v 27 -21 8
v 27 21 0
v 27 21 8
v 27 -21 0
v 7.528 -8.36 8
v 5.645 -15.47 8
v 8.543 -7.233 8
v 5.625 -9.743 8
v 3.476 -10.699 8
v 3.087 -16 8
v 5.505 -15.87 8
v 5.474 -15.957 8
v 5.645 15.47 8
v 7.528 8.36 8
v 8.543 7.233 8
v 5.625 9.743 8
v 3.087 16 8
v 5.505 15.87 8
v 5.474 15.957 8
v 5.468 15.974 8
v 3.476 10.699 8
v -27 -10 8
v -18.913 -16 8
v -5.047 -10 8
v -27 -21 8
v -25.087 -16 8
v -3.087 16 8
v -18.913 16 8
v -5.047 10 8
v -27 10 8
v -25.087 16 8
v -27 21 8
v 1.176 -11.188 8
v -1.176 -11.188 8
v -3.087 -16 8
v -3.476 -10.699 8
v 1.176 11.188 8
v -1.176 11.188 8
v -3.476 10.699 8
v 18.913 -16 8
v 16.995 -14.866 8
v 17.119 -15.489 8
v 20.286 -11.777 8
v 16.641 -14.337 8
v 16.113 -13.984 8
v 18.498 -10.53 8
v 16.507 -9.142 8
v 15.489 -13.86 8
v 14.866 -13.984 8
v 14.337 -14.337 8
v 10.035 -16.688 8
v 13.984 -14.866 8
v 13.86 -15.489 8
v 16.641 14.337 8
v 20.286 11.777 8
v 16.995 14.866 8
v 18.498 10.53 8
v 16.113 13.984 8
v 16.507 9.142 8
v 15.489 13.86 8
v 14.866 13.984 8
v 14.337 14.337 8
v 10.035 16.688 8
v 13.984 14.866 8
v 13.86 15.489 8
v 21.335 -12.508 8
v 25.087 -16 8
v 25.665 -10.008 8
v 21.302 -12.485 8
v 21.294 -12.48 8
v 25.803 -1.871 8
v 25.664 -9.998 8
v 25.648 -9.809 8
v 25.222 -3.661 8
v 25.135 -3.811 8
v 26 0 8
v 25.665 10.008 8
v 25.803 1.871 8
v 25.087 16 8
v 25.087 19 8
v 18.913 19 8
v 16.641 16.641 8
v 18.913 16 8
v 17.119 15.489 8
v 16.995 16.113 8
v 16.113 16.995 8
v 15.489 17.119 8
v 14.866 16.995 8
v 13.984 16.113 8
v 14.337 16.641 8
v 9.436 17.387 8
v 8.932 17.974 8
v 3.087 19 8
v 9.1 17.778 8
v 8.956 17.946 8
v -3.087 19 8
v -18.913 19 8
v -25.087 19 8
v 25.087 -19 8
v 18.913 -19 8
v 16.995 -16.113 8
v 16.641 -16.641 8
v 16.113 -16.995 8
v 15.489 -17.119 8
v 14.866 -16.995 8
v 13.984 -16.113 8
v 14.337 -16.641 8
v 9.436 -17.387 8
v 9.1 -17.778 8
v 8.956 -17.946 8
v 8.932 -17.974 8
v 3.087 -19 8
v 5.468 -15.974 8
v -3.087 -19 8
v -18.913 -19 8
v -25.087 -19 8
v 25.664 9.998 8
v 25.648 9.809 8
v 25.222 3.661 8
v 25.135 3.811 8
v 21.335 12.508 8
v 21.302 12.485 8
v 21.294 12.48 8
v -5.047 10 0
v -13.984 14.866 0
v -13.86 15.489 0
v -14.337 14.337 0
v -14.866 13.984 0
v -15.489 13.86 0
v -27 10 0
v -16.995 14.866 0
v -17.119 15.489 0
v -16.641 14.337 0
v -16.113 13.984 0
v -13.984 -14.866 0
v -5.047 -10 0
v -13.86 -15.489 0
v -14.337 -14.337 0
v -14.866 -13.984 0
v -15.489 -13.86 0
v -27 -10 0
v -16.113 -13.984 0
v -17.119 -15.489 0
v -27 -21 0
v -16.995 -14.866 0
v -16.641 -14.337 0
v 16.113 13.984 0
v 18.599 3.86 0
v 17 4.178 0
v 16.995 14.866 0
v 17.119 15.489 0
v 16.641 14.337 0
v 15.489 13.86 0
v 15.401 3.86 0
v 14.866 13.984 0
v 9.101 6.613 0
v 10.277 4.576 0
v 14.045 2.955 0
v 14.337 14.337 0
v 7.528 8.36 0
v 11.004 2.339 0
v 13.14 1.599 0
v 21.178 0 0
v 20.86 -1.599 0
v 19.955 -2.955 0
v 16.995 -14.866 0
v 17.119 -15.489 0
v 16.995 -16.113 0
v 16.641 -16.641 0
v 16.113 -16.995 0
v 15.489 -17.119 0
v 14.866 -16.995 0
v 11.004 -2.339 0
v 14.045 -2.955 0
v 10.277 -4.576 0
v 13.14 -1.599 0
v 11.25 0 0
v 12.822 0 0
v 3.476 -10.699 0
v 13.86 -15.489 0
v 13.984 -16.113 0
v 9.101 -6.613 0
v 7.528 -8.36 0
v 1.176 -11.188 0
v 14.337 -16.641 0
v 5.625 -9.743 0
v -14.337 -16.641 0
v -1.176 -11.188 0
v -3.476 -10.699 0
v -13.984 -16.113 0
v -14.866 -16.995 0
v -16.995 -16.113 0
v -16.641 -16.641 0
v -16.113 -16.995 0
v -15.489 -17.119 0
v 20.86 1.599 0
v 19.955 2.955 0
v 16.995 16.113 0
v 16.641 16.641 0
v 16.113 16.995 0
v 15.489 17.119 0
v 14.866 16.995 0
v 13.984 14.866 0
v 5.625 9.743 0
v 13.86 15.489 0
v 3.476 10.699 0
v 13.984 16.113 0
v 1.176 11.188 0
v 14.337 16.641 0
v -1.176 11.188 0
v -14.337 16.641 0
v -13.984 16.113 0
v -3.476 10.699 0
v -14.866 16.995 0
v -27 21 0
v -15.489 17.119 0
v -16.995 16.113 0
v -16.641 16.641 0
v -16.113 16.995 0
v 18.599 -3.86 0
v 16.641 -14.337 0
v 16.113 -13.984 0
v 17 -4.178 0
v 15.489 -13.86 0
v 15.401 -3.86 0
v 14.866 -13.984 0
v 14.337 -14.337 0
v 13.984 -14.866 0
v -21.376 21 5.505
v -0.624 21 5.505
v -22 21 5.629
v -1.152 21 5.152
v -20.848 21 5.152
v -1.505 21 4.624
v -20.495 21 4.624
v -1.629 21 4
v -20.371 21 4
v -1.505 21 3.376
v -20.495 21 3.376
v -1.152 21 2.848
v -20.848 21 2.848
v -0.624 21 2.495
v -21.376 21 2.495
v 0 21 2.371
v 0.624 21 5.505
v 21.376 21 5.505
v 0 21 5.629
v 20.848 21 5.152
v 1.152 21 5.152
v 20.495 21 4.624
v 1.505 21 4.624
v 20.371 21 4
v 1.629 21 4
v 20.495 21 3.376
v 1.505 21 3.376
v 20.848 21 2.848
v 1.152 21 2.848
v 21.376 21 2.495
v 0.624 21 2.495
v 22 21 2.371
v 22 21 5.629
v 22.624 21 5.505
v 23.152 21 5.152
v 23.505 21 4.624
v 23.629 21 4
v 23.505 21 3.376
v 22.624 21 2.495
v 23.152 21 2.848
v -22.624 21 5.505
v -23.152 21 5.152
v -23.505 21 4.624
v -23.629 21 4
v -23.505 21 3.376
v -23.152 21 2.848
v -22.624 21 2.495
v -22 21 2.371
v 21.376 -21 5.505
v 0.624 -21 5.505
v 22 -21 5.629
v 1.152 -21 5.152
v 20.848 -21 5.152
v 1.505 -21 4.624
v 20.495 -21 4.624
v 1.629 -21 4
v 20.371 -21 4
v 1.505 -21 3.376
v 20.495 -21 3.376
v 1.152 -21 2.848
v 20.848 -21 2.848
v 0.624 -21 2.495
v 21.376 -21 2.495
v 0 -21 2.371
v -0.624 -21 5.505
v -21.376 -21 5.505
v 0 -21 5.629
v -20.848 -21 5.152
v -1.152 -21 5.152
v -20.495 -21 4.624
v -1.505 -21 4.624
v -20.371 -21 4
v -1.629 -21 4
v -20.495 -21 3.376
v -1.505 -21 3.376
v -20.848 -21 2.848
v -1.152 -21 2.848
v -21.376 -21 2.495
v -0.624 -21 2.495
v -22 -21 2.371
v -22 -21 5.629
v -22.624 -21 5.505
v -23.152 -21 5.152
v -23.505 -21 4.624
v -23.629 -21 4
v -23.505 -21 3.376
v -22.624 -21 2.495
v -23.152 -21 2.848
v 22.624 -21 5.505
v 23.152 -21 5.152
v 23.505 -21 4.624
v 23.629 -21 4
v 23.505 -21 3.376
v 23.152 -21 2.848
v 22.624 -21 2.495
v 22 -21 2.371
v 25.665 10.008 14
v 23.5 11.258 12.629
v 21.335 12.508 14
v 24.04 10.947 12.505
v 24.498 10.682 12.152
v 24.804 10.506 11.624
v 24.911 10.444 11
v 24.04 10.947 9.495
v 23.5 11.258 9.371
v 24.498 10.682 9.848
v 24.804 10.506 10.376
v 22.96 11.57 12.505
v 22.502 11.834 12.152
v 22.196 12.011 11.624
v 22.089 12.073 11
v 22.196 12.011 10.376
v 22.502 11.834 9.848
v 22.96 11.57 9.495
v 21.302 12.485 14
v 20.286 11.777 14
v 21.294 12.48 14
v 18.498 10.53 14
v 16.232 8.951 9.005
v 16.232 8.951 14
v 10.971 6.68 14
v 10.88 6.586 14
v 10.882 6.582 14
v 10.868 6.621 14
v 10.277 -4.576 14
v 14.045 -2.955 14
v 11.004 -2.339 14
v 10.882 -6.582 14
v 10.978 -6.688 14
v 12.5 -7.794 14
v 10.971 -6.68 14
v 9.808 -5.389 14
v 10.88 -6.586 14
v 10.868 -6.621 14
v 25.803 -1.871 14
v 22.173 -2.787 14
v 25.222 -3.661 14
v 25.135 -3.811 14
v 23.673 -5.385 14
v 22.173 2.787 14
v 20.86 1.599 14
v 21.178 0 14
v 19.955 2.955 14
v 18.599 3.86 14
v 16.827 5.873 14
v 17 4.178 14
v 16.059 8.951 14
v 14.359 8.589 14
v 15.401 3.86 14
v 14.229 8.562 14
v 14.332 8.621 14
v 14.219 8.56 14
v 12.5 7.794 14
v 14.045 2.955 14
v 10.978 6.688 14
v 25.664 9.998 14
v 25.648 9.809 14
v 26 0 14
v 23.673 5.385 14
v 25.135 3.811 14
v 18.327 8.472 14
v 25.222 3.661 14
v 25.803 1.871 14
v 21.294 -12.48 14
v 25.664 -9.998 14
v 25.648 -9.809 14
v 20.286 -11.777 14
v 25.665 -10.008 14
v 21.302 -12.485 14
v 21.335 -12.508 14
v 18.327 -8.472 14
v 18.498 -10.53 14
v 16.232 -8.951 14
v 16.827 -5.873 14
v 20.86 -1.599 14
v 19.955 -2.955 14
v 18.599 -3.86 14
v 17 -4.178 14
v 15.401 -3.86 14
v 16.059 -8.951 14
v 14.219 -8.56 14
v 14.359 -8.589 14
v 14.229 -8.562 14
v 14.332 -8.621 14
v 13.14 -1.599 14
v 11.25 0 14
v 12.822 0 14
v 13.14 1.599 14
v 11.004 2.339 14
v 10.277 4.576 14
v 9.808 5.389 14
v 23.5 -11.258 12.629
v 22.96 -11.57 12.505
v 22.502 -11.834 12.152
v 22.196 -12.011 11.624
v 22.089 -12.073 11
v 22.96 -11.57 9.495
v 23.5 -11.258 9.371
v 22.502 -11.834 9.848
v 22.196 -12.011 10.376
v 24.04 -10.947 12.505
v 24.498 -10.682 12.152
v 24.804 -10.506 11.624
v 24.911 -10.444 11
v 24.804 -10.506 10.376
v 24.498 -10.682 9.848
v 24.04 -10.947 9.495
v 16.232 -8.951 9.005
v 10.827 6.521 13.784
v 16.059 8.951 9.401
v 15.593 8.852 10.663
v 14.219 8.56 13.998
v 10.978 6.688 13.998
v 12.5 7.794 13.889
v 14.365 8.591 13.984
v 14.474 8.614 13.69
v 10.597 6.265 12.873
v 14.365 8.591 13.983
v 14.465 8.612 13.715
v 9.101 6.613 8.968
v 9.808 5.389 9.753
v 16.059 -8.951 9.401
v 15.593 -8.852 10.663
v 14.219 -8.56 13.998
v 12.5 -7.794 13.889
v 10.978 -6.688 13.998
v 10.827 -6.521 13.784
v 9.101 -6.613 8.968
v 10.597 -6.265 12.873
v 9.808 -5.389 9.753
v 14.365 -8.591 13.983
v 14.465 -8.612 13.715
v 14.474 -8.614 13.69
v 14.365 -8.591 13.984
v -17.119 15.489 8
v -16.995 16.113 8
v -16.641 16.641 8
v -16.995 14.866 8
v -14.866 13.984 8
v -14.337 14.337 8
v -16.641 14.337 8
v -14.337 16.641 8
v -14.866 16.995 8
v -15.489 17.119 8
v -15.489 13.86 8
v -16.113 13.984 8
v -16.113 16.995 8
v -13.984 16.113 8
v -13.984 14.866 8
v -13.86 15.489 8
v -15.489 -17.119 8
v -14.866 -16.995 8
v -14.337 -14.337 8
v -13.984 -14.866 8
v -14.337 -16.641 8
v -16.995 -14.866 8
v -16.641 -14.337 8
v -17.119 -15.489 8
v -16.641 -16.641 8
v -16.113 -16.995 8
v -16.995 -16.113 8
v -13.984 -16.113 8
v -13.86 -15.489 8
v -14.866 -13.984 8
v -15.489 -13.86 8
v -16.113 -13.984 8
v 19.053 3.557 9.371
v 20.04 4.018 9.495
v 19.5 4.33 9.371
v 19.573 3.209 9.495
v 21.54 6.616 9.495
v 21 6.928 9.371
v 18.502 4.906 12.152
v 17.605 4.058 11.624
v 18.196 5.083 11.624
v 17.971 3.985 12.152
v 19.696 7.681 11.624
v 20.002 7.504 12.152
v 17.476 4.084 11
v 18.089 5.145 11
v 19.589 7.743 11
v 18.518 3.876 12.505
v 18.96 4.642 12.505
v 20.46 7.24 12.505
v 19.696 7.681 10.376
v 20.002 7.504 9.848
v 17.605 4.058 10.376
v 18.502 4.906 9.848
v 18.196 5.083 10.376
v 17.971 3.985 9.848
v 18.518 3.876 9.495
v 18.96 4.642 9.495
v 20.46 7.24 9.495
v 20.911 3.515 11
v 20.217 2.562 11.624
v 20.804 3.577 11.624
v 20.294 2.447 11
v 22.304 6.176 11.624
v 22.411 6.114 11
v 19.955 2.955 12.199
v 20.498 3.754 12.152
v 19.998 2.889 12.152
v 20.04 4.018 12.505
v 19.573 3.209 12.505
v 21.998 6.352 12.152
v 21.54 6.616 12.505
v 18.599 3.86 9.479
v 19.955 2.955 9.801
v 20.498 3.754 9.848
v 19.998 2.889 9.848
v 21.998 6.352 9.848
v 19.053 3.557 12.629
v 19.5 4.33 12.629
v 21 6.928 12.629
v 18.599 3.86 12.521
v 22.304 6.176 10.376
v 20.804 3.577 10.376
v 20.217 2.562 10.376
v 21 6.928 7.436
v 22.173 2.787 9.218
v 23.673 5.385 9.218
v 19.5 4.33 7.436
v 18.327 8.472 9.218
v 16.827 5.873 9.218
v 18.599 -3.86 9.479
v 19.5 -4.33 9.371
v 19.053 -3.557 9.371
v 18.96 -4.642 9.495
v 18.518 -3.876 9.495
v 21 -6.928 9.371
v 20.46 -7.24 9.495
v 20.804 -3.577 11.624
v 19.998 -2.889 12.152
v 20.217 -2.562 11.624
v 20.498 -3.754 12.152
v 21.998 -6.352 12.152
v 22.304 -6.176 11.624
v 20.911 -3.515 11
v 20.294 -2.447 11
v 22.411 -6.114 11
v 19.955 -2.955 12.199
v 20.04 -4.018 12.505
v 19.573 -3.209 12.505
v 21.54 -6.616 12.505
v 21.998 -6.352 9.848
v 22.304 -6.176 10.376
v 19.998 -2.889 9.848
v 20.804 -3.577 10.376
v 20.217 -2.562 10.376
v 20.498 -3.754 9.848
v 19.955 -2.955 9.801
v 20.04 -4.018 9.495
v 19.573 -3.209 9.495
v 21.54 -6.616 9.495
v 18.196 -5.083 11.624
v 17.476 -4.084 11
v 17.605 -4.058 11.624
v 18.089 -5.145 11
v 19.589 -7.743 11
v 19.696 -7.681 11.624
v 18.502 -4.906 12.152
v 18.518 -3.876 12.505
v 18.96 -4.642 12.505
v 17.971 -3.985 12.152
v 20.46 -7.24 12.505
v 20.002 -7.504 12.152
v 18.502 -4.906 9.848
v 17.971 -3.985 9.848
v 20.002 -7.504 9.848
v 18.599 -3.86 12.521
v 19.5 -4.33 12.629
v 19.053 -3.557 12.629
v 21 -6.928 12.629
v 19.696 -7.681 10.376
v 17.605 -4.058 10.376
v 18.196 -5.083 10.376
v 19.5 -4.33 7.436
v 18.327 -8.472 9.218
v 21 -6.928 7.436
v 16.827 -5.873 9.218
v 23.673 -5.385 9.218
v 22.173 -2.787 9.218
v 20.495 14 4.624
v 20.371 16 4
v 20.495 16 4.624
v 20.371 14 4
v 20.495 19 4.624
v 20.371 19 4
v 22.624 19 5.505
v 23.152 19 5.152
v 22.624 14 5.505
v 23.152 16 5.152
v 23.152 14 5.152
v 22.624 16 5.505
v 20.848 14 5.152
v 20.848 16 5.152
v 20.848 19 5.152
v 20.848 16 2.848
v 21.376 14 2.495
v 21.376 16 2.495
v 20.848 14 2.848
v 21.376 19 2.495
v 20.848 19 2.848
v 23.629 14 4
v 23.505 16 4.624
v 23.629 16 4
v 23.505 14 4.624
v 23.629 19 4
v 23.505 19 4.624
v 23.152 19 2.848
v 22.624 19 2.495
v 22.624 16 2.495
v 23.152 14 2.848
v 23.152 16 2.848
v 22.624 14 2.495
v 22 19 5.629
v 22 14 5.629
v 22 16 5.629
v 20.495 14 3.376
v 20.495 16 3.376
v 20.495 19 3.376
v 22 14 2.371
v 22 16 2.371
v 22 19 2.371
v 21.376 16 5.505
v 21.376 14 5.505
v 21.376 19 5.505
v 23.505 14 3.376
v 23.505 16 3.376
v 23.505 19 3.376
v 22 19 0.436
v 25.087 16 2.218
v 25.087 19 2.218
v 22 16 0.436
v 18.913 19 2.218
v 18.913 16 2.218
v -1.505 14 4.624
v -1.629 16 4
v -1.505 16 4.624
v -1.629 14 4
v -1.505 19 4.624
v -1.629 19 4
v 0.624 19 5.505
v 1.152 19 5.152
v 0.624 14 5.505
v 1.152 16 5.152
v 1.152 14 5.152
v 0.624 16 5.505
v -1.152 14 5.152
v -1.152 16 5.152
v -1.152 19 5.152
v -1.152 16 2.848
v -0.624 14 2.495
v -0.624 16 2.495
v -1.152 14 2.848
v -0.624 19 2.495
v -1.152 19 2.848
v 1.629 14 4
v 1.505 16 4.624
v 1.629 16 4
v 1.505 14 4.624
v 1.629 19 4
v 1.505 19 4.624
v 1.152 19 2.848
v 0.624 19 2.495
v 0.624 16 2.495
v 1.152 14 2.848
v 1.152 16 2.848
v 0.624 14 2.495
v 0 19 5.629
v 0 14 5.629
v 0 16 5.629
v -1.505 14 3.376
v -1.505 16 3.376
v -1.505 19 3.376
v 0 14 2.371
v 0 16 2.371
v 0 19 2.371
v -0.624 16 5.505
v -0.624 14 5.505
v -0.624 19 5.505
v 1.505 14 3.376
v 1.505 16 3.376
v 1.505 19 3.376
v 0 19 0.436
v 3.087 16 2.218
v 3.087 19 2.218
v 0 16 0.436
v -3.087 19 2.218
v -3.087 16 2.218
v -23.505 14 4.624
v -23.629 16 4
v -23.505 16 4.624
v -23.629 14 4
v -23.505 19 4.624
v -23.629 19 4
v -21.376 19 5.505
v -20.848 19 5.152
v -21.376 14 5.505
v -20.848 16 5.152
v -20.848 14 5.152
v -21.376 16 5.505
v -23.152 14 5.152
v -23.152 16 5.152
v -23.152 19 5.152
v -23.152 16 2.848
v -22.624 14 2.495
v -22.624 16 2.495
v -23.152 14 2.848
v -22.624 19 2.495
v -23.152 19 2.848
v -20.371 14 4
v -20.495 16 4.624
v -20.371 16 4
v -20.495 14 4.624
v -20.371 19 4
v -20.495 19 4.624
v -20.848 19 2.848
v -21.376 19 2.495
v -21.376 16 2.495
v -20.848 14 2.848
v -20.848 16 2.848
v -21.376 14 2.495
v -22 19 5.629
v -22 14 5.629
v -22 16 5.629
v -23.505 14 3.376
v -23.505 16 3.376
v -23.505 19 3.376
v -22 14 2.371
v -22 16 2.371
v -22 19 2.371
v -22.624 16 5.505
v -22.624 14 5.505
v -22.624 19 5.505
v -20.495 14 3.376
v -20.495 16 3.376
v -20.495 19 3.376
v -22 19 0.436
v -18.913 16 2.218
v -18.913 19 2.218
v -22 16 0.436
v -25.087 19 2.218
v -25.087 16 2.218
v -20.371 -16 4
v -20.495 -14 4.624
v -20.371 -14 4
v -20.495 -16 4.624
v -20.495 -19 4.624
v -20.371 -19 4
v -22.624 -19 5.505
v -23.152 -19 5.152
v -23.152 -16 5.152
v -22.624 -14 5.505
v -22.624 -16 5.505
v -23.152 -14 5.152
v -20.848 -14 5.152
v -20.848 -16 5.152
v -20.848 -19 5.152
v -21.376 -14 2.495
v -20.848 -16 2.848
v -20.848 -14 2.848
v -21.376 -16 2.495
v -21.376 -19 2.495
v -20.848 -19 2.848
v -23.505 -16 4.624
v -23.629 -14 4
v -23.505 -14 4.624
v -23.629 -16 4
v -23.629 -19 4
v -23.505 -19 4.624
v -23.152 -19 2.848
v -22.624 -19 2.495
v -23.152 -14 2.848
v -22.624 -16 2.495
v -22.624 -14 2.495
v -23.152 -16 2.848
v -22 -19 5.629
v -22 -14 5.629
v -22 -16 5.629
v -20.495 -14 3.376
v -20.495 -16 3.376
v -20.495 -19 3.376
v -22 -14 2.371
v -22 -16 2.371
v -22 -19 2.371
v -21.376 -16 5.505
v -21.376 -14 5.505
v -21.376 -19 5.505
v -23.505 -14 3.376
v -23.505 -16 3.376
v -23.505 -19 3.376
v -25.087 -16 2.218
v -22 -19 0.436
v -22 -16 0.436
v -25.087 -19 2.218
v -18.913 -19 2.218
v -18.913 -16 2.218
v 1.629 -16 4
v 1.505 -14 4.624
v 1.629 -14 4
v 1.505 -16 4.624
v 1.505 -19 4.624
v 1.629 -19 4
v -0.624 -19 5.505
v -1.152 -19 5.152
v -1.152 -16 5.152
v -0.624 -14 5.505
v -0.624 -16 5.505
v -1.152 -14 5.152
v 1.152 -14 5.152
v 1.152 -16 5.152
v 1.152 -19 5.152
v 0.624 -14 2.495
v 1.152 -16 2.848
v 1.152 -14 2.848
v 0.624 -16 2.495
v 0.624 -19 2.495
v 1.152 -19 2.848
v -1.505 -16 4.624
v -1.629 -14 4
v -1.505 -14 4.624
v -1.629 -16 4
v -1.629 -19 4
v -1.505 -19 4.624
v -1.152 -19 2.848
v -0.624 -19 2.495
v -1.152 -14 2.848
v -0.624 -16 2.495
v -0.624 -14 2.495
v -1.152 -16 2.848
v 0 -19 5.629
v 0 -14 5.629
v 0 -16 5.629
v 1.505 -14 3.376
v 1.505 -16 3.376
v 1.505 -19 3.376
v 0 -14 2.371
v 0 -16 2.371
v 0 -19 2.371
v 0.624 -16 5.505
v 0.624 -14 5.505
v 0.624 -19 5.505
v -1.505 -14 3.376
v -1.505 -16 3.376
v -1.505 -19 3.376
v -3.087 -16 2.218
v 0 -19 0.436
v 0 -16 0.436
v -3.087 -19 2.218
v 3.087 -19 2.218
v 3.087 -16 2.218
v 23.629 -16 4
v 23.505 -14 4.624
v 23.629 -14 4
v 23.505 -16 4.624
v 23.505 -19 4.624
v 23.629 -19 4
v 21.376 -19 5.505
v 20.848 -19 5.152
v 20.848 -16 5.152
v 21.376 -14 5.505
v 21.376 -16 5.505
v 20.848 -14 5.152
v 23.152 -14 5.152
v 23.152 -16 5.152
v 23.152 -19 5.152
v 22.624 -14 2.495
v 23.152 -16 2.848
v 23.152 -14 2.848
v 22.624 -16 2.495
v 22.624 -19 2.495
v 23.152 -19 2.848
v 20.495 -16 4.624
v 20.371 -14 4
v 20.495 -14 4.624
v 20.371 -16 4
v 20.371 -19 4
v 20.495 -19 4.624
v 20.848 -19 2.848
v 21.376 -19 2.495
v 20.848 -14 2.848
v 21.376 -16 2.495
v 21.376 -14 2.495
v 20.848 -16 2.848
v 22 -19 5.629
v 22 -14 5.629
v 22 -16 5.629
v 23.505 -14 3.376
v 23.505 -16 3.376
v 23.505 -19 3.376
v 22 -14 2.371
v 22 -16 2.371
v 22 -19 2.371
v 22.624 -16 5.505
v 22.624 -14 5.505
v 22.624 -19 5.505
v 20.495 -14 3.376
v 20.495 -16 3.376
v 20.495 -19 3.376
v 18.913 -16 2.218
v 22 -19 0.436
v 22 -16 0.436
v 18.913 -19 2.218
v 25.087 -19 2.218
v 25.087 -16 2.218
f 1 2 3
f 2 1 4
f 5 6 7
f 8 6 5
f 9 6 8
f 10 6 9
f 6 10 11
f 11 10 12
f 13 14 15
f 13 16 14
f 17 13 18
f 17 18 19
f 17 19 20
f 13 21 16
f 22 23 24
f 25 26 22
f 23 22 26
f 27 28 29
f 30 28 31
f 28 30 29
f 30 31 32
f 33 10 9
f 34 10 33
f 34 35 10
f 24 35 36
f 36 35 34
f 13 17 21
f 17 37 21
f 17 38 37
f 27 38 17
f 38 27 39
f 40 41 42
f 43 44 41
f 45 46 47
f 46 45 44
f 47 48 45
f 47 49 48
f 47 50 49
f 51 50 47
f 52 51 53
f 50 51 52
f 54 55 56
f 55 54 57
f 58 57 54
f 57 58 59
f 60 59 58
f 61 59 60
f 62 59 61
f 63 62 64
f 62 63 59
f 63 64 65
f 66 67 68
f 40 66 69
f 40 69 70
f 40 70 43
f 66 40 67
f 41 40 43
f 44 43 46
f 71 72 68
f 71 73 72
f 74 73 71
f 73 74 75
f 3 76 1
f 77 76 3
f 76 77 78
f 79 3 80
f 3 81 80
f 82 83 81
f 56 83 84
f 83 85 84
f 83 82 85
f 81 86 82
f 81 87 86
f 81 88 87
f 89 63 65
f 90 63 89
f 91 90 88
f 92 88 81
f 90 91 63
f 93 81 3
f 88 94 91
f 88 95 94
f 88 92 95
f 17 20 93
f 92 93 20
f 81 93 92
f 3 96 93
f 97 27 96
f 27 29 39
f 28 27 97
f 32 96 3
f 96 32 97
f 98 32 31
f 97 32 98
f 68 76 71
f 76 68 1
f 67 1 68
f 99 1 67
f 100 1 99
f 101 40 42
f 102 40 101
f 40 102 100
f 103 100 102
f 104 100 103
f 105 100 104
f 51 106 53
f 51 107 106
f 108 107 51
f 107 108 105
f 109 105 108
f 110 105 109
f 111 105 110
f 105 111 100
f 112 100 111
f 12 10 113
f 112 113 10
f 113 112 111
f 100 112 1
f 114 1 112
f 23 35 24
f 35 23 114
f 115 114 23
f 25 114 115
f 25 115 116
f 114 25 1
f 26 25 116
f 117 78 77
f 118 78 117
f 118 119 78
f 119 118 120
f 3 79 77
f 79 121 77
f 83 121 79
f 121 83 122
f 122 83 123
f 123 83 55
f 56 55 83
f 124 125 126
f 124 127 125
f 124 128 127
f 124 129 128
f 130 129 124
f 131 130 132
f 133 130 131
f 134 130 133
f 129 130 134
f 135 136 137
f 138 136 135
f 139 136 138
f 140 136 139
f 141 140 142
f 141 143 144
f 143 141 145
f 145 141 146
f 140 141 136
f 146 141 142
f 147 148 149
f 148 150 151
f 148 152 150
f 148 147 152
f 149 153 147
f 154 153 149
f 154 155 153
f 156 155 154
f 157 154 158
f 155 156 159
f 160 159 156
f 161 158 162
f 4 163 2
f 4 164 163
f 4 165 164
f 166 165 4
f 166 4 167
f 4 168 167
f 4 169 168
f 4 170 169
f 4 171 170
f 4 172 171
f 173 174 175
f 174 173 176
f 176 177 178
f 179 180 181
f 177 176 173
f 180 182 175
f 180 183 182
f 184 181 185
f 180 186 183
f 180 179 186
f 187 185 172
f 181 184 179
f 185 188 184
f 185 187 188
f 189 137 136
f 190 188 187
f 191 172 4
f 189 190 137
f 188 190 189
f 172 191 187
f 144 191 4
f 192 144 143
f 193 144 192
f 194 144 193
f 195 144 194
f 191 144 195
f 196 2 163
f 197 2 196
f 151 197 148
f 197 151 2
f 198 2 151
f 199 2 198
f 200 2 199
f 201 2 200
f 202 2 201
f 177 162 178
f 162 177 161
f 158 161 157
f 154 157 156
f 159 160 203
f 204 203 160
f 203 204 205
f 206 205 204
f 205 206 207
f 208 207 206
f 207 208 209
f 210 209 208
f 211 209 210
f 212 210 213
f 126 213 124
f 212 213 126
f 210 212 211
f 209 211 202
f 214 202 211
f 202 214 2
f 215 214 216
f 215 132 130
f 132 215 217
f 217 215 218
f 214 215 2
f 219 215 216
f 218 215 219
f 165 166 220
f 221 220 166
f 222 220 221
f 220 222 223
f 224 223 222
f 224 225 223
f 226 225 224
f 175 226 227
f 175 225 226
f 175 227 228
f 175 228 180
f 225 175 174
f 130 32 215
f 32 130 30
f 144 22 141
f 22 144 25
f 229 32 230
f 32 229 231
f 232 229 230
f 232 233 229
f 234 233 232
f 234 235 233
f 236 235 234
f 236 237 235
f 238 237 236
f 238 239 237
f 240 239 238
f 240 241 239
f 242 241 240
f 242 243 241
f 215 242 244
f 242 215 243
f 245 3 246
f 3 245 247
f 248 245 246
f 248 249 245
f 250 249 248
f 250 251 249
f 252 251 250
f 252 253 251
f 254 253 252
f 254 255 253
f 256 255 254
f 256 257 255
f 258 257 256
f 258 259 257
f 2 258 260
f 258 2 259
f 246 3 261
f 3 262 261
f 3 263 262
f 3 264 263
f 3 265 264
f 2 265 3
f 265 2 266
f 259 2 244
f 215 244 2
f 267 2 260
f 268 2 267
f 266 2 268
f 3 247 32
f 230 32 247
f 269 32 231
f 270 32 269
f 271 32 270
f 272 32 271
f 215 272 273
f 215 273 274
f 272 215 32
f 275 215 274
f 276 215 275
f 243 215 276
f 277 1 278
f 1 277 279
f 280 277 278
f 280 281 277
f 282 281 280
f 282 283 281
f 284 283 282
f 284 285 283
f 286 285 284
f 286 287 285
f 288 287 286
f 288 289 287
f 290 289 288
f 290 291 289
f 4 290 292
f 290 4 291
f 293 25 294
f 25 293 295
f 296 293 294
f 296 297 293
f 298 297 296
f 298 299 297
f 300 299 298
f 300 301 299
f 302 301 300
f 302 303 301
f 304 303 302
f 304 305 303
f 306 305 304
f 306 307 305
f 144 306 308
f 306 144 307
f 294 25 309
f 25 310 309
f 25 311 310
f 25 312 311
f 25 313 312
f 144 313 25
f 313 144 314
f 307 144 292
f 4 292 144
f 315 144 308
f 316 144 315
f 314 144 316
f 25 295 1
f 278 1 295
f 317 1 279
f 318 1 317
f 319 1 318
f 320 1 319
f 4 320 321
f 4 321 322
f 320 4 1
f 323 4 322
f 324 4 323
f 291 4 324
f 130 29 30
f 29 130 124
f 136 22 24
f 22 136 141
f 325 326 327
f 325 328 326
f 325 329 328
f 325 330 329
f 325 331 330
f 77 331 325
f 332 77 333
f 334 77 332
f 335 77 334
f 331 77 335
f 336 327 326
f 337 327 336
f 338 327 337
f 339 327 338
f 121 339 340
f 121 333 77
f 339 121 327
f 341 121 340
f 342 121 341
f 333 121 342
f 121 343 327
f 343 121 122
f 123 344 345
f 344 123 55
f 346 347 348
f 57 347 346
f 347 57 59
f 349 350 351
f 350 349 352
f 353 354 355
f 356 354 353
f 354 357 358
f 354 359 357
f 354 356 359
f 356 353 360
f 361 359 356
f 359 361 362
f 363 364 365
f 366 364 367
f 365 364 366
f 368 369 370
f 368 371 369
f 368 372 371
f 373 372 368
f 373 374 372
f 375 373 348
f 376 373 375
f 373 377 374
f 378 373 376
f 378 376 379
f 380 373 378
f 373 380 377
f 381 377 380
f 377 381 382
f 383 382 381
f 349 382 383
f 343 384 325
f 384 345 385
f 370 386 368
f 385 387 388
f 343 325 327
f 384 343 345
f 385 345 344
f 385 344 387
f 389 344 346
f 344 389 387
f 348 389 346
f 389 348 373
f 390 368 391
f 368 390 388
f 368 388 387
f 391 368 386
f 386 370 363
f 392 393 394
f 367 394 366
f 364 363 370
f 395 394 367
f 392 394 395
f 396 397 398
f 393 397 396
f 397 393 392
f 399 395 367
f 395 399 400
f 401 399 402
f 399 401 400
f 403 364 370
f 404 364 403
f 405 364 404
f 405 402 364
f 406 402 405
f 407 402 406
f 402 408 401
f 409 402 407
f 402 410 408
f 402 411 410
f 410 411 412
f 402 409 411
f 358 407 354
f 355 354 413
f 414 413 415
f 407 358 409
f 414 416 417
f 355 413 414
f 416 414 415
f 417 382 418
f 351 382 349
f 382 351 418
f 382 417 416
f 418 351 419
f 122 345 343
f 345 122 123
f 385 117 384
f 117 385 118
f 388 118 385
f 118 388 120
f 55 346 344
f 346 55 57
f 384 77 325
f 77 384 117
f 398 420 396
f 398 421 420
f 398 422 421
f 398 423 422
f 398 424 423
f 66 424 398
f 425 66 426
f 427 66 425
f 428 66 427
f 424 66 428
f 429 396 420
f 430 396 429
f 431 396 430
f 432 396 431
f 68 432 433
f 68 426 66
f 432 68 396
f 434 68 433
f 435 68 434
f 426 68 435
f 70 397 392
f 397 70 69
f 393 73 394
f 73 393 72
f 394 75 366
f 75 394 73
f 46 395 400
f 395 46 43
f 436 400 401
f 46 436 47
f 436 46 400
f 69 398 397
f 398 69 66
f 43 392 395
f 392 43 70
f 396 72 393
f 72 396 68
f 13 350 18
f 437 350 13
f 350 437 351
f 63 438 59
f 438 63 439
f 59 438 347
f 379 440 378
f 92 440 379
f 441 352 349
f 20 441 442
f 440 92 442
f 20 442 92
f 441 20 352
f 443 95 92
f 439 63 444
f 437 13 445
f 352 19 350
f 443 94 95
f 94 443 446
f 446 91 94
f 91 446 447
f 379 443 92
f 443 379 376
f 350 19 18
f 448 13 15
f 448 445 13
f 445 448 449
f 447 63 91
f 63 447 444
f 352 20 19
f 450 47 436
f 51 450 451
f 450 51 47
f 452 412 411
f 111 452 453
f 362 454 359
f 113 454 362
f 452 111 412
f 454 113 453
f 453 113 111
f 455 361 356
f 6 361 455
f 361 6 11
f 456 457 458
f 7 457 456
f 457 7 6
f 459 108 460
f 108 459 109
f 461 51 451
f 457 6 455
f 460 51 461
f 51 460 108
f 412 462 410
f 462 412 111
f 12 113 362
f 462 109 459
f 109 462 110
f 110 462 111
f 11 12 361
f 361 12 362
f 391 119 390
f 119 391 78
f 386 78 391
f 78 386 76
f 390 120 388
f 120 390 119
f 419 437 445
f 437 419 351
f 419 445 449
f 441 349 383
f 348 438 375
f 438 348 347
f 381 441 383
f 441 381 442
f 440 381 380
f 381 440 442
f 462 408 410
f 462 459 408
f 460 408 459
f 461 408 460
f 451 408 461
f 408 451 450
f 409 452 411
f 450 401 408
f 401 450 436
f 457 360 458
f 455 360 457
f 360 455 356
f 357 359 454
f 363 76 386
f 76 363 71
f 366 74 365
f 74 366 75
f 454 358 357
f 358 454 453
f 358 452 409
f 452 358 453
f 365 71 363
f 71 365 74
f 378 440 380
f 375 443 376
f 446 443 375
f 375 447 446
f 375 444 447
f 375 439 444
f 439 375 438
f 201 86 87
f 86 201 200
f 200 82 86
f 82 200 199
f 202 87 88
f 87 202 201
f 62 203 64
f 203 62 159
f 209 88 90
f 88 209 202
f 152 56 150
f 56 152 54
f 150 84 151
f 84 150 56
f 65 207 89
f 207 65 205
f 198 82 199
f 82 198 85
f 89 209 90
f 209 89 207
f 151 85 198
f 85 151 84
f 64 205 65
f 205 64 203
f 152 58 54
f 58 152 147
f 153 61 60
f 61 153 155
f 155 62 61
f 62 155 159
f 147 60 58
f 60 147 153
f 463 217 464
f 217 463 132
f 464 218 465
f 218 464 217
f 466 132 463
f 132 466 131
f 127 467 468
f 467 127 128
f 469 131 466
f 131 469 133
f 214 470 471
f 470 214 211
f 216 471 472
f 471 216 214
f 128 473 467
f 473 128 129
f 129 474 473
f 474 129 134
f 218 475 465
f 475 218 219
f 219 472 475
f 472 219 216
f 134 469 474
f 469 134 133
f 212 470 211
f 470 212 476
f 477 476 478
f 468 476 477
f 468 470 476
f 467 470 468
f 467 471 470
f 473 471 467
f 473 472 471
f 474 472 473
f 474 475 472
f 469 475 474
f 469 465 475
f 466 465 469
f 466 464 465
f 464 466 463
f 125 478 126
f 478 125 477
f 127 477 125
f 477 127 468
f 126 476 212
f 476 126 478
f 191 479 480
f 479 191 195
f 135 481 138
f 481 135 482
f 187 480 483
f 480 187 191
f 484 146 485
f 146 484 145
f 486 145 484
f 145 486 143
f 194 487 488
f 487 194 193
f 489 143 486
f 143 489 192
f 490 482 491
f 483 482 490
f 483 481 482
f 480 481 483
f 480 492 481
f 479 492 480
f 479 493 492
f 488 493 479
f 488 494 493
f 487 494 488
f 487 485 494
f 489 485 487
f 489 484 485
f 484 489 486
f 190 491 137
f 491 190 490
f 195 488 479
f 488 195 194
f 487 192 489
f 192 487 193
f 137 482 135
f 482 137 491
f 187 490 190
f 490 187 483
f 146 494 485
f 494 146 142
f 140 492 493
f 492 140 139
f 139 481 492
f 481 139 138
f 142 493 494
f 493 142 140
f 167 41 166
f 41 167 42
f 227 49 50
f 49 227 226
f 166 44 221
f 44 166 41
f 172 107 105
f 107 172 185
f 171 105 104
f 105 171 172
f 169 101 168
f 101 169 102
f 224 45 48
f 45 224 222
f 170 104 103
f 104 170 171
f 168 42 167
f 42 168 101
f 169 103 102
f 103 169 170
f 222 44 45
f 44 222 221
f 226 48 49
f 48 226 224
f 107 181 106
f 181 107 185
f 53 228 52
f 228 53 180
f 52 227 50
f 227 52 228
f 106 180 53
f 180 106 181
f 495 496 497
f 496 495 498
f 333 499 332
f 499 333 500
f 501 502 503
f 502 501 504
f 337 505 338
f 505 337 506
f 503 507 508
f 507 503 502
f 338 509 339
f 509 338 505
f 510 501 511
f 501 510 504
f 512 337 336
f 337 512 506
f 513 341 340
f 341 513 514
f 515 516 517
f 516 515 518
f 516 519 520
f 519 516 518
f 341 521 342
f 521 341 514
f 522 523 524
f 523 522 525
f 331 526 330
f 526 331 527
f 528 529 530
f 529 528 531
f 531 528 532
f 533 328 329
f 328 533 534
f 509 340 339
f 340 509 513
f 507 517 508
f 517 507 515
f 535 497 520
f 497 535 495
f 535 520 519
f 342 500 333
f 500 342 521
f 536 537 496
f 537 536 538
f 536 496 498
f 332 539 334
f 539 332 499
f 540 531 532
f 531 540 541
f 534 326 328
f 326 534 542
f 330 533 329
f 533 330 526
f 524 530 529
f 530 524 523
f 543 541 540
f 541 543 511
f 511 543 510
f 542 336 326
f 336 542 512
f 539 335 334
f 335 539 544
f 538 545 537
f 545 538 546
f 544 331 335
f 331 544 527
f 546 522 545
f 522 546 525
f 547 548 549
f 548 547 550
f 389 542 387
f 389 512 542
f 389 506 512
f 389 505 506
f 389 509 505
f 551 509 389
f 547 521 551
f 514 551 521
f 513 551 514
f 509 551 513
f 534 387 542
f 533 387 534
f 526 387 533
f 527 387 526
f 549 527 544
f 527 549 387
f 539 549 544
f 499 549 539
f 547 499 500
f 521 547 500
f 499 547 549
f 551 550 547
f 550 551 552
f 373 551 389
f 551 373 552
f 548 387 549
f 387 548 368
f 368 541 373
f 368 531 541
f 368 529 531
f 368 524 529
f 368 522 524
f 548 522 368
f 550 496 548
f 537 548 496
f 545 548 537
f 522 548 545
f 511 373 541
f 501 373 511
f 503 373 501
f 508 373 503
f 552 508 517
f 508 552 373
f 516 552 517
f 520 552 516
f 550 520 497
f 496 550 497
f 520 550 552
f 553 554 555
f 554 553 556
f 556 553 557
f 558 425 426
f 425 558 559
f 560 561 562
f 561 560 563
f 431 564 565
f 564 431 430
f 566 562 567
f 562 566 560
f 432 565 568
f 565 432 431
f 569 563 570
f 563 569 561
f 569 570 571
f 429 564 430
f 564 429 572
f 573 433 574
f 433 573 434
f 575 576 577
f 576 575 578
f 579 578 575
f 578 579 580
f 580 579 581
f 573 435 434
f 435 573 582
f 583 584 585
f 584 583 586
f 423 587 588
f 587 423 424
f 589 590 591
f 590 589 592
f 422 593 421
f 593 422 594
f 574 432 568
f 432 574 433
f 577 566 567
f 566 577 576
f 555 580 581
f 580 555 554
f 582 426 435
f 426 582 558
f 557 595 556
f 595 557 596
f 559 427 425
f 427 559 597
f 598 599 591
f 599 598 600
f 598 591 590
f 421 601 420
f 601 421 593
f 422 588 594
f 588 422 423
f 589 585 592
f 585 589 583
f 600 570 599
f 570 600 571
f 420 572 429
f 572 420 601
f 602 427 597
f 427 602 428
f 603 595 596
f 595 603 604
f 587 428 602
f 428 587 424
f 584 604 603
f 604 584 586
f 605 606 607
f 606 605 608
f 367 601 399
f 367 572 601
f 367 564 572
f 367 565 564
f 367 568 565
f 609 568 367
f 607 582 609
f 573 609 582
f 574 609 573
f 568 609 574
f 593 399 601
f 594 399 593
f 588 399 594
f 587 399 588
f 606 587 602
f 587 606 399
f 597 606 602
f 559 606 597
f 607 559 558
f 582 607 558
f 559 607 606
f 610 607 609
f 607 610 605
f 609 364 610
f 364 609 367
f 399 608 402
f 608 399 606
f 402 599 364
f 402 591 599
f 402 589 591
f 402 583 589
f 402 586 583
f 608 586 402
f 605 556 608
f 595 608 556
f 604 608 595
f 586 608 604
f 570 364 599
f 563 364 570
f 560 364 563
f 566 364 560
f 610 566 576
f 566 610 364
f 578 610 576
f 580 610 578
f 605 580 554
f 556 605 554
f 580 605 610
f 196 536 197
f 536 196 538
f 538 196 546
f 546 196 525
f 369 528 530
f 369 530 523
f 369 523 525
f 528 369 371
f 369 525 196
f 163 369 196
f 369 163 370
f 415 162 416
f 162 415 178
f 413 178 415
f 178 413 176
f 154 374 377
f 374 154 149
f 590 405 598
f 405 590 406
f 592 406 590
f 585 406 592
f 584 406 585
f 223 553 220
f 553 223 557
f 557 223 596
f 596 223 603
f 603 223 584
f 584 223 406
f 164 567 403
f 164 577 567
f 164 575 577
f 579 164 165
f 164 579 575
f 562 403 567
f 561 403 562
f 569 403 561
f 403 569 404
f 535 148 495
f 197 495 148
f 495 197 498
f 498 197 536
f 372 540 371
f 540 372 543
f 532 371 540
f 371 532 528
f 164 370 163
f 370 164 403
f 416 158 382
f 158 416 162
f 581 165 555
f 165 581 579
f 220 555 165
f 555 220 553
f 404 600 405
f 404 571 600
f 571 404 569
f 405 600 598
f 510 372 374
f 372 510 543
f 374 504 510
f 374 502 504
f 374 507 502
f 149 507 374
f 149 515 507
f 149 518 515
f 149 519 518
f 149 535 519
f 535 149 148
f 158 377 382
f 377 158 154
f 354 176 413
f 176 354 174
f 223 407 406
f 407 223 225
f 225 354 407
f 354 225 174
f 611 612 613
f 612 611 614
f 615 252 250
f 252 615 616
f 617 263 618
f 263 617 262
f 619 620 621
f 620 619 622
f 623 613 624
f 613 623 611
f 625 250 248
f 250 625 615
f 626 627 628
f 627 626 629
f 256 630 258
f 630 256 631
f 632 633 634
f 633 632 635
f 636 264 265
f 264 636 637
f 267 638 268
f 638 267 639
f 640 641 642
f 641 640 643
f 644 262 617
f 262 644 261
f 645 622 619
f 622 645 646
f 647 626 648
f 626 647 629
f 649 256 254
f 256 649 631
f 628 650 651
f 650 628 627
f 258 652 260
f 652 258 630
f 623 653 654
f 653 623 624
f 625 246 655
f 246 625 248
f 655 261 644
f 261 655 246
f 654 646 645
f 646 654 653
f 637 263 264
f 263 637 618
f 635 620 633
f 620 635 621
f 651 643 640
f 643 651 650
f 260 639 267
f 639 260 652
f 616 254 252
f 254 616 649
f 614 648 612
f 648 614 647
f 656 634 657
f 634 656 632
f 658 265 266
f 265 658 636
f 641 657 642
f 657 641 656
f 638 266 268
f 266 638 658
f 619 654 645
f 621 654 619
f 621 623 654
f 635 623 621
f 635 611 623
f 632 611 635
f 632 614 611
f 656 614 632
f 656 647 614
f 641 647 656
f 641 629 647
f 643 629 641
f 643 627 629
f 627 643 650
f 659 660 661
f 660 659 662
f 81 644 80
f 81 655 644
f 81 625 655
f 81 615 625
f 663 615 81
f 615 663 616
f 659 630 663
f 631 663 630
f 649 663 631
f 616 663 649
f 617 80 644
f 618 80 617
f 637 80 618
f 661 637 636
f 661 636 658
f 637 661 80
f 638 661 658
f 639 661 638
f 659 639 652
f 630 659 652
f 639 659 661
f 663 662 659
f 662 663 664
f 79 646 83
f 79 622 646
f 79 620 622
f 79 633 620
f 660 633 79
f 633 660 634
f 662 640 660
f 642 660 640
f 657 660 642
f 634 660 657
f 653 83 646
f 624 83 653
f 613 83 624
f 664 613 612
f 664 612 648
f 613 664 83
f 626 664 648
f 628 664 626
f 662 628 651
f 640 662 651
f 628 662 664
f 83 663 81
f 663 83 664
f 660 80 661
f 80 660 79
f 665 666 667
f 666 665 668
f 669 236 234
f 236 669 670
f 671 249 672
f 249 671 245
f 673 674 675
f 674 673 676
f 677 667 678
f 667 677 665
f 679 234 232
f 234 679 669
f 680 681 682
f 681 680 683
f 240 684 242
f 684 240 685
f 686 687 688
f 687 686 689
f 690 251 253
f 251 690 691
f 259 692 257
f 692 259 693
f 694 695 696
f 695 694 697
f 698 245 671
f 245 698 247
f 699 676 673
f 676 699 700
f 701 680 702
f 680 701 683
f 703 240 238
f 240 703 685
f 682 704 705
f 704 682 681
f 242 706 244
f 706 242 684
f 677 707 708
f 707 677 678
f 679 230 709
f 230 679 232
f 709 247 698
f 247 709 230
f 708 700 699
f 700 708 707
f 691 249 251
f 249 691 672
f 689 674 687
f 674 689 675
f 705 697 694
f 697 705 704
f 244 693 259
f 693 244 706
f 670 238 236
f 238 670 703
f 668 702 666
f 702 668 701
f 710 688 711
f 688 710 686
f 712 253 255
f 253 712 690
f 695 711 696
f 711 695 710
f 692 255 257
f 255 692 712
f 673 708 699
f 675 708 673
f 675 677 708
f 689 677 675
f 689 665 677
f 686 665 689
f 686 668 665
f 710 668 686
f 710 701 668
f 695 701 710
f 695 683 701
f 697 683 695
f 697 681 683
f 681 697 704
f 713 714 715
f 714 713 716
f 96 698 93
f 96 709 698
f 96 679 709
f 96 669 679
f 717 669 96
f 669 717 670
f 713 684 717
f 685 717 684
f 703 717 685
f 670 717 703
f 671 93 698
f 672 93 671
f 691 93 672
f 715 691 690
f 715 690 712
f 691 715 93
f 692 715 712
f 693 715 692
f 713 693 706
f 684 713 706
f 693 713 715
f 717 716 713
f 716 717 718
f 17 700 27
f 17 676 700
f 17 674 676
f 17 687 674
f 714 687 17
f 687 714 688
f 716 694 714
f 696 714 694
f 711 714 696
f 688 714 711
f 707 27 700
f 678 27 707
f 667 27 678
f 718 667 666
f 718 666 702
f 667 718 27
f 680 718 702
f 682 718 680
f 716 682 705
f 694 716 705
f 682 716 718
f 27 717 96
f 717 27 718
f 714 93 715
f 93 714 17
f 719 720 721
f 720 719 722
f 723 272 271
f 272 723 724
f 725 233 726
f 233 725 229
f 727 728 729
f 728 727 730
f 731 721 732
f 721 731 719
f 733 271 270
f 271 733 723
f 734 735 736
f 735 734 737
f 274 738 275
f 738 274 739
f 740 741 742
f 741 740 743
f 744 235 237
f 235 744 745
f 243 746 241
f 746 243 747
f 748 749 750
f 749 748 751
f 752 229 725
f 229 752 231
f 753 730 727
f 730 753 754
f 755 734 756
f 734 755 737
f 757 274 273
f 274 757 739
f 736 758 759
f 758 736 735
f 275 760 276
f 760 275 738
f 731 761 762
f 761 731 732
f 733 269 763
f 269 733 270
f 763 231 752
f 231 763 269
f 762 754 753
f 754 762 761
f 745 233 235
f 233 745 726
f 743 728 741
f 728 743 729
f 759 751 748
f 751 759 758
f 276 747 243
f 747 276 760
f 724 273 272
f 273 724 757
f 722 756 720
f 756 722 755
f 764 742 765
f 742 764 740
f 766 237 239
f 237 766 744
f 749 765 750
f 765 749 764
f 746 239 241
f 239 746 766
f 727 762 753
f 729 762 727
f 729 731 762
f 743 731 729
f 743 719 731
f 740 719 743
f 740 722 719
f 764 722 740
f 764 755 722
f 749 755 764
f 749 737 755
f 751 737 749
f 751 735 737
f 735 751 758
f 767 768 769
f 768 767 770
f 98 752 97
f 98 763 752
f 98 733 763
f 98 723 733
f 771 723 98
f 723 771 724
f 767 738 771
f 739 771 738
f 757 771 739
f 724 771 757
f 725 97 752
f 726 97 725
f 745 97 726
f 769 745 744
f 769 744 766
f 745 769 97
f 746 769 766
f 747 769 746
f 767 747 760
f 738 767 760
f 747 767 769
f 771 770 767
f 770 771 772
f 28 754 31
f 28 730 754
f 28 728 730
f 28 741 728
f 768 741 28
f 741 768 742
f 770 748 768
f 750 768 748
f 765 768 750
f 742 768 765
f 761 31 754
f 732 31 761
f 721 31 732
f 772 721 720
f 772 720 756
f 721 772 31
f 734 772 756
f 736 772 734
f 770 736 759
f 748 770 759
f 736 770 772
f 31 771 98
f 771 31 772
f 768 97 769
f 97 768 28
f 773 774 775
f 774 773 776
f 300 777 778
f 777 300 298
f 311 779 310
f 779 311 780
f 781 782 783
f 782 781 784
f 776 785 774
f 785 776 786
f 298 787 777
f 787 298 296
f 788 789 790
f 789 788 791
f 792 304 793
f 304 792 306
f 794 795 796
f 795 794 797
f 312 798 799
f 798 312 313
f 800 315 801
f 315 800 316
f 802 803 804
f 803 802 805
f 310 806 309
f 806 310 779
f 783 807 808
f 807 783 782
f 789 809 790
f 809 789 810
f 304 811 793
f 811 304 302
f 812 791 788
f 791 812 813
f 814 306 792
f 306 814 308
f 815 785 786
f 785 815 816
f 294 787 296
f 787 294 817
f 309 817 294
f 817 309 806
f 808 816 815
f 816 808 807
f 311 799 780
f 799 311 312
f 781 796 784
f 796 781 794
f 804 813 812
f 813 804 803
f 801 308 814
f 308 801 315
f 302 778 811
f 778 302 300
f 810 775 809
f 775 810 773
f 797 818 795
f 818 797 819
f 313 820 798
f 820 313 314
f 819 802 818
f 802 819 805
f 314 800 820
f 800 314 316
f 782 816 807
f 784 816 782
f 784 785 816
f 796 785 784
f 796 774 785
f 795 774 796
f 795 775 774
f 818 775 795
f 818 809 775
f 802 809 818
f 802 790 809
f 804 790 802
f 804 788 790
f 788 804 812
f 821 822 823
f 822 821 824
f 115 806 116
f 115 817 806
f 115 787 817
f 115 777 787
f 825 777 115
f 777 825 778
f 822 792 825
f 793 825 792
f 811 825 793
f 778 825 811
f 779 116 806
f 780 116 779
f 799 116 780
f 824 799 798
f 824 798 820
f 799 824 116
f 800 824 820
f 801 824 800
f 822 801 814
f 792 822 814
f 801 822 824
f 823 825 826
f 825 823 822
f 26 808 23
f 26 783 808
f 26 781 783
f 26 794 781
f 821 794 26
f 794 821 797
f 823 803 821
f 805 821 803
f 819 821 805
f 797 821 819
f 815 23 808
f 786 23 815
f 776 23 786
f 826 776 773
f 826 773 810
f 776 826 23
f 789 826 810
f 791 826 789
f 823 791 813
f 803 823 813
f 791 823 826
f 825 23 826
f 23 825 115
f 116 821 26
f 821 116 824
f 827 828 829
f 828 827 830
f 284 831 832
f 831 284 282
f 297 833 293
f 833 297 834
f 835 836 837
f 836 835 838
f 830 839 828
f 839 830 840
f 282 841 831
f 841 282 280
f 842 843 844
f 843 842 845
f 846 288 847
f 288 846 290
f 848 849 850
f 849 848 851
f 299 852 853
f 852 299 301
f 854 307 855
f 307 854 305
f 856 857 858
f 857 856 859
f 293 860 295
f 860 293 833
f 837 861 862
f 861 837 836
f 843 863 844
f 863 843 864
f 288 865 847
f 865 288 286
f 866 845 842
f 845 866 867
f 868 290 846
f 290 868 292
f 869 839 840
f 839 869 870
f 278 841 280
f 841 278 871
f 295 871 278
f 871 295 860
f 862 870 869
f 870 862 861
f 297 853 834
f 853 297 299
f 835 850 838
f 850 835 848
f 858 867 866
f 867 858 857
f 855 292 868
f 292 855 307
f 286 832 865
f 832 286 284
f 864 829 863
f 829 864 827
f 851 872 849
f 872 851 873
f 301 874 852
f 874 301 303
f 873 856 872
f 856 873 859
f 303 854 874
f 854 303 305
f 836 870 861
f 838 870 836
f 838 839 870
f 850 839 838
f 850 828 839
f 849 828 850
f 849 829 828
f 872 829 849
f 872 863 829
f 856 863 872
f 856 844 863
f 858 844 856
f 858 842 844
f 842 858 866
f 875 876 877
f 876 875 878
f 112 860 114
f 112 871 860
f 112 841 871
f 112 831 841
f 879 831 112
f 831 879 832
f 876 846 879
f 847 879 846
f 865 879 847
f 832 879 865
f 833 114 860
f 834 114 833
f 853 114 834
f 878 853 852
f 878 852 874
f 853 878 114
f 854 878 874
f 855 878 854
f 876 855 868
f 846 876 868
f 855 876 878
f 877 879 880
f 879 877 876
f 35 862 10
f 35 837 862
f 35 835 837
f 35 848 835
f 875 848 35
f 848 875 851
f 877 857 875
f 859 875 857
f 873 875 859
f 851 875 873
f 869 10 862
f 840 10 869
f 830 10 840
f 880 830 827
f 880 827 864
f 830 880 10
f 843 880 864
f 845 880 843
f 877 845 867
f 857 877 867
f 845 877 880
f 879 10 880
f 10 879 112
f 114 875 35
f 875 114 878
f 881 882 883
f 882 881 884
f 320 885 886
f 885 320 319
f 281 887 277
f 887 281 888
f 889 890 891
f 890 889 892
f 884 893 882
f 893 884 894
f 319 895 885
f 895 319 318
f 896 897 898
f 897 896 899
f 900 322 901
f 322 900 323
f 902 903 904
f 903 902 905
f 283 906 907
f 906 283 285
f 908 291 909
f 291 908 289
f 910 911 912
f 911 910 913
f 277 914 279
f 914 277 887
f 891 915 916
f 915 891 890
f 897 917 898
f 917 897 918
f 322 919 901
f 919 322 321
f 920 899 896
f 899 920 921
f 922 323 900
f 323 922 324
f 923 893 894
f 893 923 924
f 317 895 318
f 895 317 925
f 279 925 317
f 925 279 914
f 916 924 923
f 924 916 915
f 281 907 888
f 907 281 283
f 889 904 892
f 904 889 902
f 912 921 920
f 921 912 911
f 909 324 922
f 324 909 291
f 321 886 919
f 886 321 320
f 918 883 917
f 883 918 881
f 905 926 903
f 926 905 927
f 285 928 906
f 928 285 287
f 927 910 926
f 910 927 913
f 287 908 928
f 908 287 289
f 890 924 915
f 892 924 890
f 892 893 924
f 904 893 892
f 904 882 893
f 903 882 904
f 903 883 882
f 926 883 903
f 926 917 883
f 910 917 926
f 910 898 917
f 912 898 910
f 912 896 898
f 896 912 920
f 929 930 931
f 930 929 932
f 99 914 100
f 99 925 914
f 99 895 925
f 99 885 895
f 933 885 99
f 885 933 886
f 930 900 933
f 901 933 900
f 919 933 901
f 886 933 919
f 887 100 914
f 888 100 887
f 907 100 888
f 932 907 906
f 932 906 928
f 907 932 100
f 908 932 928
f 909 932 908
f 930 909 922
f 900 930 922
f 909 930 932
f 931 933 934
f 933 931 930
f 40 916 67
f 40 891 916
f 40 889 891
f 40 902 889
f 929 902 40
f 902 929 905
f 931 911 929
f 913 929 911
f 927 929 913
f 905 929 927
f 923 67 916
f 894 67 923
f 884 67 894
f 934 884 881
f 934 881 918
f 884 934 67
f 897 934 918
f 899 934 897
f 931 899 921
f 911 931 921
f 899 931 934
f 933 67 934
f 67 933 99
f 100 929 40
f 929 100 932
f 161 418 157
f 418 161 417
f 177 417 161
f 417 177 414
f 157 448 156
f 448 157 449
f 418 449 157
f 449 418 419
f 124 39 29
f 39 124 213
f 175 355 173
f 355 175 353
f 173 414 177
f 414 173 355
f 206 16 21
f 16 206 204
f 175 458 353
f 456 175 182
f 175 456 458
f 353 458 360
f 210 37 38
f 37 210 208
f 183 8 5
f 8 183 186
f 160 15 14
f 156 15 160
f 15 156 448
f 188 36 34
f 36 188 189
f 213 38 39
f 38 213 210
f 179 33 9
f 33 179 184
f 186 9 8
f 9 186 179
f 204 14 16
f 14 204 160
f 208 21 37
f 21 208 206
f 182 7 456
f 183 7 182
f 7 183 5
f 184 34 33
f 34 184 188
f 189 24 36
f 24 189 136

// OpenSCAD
// file: bolts.scad
$radial_error = 0.1;
$fn = 4*4;

module cylinder_outer(height, radius, fn=$fn, radial_error=$radial_error) {
	fudge = 1/cos(180/fn);
	cylinder(h=height,r=radius*fudge+$radial_error, $fn=fn);
}

module cylinder_inner(height, radius, fn=$fn) {
	cylinder(h=height,r=radius-$radial_error,$fn=fn);
}

// Make a hole. The diameter is the size of the screw (e.g. 3 for M3). Depth is how far the hole should go for the thread, and inset is how far out there should be a hole for the head to go.
module hole(diameter=3, depth=6, inset=10) {
	cylinder_outer(depth, diameter/2);
	translate([0, 0, depth]) cylinder_outer(inset, diameter, 32);
}

module countersunk_hole(diameter=3, depth=6, inset=10) {
	hole(diameter, depth, inset);
	translate([0, 0, depth-diameter/2]) cylinder(r1=diameter/2+$radial_error, r2=diameter+$radial_error, h=diameter/2);
}

module threaded_countersunk_hole(diameter=3, depth=6, inset=10) {
	hole(diameter*0.9, depth, inset);
	translate([0, 0, depth-diameter/2]) cylinder(r1=diameter/2+$radial_error, r2=diameter+$radial_error, h=diameter/2);
}

module knurled_insert(diameter = 3, depth = 6, thickness = 1) {
	cylinder_inner(depth, diameter/2 + thickness);
}

module knurled_hole(diameter = 3, depth = 6, inset = 10, insert = 4, thickness = 1) {
	hole(diameter, depth, inset);
	
	knurled_insert(diameter, insert, thickness);
}

module countersunk_knurled_hole(diameter = 3, depth = 6, inset = 10, insert = 4, thickness = 1) {
	countersunk_hole(diameter, depth, inset);
	
	knurled_insert(diameter, insert, thickness);
}

// Make a hole for a bolt/screw combination.
module bolted_hole(diameter=3, depth=8, nut_offset=2, shaft_length=10, inset=10) {
	hole(diameter, depth, inset);
	hull() {
		shaft_width = diameter;
		translate([0, 0, nut_offset]) rotate(360/12, [0, 0, 1]) cylinder_outer(diameter, shaft_width, 6);
		translate([0, shaft_length, nut_offset]) rotate(360/12, [0, 0, 1]) cylinder_outer(diameter, shaft_width, 6);
	}
}

module countersunk_bolted_hole(diameter=3, depth=8, nut_offset=2, shaft_length=10, inset=10) {
	countersunk_hole(diameter, depth, inset);
	hull() {
		shaft_width = diameter;
		translate([0, 0, nut_offset]) rotate(360/12, [0, 0, 1]) cylinder_outer(diameter, shaft_width, 6);
		translate([0, shaft_length, nut_offset]) rotate(360/12, [0, 0, 1]) cylinder_outer(diameter, shaft_width, 6);
	}
}

module mounting_hole(diameter=3, depth=6, inset=10, outset=3) {
	difference() {
		cylinder_outer(depth, diameter/2+outset);
		hole(diameter=diameter, depth=depth, inset=inset);
	}
}

render() rotate(90, [1, 0, 0]) difference() {
	cube([40, 10, 10]);
	translate([5, 5, 0]) bolted_hole(diameter=3, depth=8);
	translate([15, 5, 0]) bolted_hole(diameter=4, depth=8);
	translate([25, 5, 0]) countersunk_hole(diameter=4, depth=8);
	translate([35, 5, 0]) knurled_hole();
}
// main file
$fs = 0.01;

use <bolts.scad>;

module support() {
	translate([3, 0, 1]) rotate(90, [0, -1, 0]) linear_extrude(height=8, scale=[1, 2.5]) square([6, 5], center=true);
}

base_thickness = 8;
bar_tolerance = 0.6;
bar_offset = 17;
support_rotation = 60.0;
support_rotations = [support_rotation, -support_rotation];

skew = [[2, 0, -1.8, 0],
        [0, 0.8, 0, 0],  // The "0.8" is the skew value; pushed along the y axis
        [0, 0, 1, 0],
        [0, 0, 0, 1]]; 

render() difference() {
	union() {
		color("green") translate([0, 0, base_thickness/2]) difference() {
			cube([54, 42, base_thickness], center=true);
			translate([-15, 0, 0]) cube([30, 20, base_thickness], center=true);
		}
		
		translate([0,0,2]) {
			translate([bar_offset, 0, 2]) cylinder(h=10, d=18);
			for(i = support_rotations) {
				translate([bar_offset, 0, 0]) rotate(i, [0, 0, 1]) {
					translate([10, 0, 8]) support();
				}
			}
			
			for(i = support_rotations) {
				translate([bar_offset, 0, 0]) rotate(180-i, [0, 0, 1]) {
					translate([10, 0, 8]) multmatrix(skew) support();
				}
			}
		}
	}
	translate([0, 0, -1]) {
		cylinder(h=22, d=22.5);
	}
	for(i = [0:90:360]) {
		rotate(45+i, [0, 0, 1]) translate([43.81/2, 0, 0]) hole(depth=8, inset=0);
	}
	translate([bar_offset, 0, 0]) {
		translate([0, 0, -1]) cylinder_outer(22, 4);
		
		for(i = support_rotations) {
			rotate(i, [0, 0, 1]) {
				translate([3, 0, 11]) {
					rotate(90, [0,0,1]) rotate(90, [1,0,0]) bolted_hole(depth=10, nut_offset=2, inset=0);
				}
			}
		}
	}
	
	// 6 holes around outside
	for(i = [90:180:360]) {
		rotate(i, [0, 0, 1]) {
			translate([14, -22, 4]) rotate(90, [0,0,1]) rotate(90, [1,0,0]) bolted_hole();
			translate([14, 0, 4]) rotate(90, [0,0,1]) rotate(90, [1,0,0]) bolted_hole();
			translate([14, 22, 4]) rotate(90, [0,0,1]) rotate(90, [1,0,0]) bolted_hole();
		}
	}
}
